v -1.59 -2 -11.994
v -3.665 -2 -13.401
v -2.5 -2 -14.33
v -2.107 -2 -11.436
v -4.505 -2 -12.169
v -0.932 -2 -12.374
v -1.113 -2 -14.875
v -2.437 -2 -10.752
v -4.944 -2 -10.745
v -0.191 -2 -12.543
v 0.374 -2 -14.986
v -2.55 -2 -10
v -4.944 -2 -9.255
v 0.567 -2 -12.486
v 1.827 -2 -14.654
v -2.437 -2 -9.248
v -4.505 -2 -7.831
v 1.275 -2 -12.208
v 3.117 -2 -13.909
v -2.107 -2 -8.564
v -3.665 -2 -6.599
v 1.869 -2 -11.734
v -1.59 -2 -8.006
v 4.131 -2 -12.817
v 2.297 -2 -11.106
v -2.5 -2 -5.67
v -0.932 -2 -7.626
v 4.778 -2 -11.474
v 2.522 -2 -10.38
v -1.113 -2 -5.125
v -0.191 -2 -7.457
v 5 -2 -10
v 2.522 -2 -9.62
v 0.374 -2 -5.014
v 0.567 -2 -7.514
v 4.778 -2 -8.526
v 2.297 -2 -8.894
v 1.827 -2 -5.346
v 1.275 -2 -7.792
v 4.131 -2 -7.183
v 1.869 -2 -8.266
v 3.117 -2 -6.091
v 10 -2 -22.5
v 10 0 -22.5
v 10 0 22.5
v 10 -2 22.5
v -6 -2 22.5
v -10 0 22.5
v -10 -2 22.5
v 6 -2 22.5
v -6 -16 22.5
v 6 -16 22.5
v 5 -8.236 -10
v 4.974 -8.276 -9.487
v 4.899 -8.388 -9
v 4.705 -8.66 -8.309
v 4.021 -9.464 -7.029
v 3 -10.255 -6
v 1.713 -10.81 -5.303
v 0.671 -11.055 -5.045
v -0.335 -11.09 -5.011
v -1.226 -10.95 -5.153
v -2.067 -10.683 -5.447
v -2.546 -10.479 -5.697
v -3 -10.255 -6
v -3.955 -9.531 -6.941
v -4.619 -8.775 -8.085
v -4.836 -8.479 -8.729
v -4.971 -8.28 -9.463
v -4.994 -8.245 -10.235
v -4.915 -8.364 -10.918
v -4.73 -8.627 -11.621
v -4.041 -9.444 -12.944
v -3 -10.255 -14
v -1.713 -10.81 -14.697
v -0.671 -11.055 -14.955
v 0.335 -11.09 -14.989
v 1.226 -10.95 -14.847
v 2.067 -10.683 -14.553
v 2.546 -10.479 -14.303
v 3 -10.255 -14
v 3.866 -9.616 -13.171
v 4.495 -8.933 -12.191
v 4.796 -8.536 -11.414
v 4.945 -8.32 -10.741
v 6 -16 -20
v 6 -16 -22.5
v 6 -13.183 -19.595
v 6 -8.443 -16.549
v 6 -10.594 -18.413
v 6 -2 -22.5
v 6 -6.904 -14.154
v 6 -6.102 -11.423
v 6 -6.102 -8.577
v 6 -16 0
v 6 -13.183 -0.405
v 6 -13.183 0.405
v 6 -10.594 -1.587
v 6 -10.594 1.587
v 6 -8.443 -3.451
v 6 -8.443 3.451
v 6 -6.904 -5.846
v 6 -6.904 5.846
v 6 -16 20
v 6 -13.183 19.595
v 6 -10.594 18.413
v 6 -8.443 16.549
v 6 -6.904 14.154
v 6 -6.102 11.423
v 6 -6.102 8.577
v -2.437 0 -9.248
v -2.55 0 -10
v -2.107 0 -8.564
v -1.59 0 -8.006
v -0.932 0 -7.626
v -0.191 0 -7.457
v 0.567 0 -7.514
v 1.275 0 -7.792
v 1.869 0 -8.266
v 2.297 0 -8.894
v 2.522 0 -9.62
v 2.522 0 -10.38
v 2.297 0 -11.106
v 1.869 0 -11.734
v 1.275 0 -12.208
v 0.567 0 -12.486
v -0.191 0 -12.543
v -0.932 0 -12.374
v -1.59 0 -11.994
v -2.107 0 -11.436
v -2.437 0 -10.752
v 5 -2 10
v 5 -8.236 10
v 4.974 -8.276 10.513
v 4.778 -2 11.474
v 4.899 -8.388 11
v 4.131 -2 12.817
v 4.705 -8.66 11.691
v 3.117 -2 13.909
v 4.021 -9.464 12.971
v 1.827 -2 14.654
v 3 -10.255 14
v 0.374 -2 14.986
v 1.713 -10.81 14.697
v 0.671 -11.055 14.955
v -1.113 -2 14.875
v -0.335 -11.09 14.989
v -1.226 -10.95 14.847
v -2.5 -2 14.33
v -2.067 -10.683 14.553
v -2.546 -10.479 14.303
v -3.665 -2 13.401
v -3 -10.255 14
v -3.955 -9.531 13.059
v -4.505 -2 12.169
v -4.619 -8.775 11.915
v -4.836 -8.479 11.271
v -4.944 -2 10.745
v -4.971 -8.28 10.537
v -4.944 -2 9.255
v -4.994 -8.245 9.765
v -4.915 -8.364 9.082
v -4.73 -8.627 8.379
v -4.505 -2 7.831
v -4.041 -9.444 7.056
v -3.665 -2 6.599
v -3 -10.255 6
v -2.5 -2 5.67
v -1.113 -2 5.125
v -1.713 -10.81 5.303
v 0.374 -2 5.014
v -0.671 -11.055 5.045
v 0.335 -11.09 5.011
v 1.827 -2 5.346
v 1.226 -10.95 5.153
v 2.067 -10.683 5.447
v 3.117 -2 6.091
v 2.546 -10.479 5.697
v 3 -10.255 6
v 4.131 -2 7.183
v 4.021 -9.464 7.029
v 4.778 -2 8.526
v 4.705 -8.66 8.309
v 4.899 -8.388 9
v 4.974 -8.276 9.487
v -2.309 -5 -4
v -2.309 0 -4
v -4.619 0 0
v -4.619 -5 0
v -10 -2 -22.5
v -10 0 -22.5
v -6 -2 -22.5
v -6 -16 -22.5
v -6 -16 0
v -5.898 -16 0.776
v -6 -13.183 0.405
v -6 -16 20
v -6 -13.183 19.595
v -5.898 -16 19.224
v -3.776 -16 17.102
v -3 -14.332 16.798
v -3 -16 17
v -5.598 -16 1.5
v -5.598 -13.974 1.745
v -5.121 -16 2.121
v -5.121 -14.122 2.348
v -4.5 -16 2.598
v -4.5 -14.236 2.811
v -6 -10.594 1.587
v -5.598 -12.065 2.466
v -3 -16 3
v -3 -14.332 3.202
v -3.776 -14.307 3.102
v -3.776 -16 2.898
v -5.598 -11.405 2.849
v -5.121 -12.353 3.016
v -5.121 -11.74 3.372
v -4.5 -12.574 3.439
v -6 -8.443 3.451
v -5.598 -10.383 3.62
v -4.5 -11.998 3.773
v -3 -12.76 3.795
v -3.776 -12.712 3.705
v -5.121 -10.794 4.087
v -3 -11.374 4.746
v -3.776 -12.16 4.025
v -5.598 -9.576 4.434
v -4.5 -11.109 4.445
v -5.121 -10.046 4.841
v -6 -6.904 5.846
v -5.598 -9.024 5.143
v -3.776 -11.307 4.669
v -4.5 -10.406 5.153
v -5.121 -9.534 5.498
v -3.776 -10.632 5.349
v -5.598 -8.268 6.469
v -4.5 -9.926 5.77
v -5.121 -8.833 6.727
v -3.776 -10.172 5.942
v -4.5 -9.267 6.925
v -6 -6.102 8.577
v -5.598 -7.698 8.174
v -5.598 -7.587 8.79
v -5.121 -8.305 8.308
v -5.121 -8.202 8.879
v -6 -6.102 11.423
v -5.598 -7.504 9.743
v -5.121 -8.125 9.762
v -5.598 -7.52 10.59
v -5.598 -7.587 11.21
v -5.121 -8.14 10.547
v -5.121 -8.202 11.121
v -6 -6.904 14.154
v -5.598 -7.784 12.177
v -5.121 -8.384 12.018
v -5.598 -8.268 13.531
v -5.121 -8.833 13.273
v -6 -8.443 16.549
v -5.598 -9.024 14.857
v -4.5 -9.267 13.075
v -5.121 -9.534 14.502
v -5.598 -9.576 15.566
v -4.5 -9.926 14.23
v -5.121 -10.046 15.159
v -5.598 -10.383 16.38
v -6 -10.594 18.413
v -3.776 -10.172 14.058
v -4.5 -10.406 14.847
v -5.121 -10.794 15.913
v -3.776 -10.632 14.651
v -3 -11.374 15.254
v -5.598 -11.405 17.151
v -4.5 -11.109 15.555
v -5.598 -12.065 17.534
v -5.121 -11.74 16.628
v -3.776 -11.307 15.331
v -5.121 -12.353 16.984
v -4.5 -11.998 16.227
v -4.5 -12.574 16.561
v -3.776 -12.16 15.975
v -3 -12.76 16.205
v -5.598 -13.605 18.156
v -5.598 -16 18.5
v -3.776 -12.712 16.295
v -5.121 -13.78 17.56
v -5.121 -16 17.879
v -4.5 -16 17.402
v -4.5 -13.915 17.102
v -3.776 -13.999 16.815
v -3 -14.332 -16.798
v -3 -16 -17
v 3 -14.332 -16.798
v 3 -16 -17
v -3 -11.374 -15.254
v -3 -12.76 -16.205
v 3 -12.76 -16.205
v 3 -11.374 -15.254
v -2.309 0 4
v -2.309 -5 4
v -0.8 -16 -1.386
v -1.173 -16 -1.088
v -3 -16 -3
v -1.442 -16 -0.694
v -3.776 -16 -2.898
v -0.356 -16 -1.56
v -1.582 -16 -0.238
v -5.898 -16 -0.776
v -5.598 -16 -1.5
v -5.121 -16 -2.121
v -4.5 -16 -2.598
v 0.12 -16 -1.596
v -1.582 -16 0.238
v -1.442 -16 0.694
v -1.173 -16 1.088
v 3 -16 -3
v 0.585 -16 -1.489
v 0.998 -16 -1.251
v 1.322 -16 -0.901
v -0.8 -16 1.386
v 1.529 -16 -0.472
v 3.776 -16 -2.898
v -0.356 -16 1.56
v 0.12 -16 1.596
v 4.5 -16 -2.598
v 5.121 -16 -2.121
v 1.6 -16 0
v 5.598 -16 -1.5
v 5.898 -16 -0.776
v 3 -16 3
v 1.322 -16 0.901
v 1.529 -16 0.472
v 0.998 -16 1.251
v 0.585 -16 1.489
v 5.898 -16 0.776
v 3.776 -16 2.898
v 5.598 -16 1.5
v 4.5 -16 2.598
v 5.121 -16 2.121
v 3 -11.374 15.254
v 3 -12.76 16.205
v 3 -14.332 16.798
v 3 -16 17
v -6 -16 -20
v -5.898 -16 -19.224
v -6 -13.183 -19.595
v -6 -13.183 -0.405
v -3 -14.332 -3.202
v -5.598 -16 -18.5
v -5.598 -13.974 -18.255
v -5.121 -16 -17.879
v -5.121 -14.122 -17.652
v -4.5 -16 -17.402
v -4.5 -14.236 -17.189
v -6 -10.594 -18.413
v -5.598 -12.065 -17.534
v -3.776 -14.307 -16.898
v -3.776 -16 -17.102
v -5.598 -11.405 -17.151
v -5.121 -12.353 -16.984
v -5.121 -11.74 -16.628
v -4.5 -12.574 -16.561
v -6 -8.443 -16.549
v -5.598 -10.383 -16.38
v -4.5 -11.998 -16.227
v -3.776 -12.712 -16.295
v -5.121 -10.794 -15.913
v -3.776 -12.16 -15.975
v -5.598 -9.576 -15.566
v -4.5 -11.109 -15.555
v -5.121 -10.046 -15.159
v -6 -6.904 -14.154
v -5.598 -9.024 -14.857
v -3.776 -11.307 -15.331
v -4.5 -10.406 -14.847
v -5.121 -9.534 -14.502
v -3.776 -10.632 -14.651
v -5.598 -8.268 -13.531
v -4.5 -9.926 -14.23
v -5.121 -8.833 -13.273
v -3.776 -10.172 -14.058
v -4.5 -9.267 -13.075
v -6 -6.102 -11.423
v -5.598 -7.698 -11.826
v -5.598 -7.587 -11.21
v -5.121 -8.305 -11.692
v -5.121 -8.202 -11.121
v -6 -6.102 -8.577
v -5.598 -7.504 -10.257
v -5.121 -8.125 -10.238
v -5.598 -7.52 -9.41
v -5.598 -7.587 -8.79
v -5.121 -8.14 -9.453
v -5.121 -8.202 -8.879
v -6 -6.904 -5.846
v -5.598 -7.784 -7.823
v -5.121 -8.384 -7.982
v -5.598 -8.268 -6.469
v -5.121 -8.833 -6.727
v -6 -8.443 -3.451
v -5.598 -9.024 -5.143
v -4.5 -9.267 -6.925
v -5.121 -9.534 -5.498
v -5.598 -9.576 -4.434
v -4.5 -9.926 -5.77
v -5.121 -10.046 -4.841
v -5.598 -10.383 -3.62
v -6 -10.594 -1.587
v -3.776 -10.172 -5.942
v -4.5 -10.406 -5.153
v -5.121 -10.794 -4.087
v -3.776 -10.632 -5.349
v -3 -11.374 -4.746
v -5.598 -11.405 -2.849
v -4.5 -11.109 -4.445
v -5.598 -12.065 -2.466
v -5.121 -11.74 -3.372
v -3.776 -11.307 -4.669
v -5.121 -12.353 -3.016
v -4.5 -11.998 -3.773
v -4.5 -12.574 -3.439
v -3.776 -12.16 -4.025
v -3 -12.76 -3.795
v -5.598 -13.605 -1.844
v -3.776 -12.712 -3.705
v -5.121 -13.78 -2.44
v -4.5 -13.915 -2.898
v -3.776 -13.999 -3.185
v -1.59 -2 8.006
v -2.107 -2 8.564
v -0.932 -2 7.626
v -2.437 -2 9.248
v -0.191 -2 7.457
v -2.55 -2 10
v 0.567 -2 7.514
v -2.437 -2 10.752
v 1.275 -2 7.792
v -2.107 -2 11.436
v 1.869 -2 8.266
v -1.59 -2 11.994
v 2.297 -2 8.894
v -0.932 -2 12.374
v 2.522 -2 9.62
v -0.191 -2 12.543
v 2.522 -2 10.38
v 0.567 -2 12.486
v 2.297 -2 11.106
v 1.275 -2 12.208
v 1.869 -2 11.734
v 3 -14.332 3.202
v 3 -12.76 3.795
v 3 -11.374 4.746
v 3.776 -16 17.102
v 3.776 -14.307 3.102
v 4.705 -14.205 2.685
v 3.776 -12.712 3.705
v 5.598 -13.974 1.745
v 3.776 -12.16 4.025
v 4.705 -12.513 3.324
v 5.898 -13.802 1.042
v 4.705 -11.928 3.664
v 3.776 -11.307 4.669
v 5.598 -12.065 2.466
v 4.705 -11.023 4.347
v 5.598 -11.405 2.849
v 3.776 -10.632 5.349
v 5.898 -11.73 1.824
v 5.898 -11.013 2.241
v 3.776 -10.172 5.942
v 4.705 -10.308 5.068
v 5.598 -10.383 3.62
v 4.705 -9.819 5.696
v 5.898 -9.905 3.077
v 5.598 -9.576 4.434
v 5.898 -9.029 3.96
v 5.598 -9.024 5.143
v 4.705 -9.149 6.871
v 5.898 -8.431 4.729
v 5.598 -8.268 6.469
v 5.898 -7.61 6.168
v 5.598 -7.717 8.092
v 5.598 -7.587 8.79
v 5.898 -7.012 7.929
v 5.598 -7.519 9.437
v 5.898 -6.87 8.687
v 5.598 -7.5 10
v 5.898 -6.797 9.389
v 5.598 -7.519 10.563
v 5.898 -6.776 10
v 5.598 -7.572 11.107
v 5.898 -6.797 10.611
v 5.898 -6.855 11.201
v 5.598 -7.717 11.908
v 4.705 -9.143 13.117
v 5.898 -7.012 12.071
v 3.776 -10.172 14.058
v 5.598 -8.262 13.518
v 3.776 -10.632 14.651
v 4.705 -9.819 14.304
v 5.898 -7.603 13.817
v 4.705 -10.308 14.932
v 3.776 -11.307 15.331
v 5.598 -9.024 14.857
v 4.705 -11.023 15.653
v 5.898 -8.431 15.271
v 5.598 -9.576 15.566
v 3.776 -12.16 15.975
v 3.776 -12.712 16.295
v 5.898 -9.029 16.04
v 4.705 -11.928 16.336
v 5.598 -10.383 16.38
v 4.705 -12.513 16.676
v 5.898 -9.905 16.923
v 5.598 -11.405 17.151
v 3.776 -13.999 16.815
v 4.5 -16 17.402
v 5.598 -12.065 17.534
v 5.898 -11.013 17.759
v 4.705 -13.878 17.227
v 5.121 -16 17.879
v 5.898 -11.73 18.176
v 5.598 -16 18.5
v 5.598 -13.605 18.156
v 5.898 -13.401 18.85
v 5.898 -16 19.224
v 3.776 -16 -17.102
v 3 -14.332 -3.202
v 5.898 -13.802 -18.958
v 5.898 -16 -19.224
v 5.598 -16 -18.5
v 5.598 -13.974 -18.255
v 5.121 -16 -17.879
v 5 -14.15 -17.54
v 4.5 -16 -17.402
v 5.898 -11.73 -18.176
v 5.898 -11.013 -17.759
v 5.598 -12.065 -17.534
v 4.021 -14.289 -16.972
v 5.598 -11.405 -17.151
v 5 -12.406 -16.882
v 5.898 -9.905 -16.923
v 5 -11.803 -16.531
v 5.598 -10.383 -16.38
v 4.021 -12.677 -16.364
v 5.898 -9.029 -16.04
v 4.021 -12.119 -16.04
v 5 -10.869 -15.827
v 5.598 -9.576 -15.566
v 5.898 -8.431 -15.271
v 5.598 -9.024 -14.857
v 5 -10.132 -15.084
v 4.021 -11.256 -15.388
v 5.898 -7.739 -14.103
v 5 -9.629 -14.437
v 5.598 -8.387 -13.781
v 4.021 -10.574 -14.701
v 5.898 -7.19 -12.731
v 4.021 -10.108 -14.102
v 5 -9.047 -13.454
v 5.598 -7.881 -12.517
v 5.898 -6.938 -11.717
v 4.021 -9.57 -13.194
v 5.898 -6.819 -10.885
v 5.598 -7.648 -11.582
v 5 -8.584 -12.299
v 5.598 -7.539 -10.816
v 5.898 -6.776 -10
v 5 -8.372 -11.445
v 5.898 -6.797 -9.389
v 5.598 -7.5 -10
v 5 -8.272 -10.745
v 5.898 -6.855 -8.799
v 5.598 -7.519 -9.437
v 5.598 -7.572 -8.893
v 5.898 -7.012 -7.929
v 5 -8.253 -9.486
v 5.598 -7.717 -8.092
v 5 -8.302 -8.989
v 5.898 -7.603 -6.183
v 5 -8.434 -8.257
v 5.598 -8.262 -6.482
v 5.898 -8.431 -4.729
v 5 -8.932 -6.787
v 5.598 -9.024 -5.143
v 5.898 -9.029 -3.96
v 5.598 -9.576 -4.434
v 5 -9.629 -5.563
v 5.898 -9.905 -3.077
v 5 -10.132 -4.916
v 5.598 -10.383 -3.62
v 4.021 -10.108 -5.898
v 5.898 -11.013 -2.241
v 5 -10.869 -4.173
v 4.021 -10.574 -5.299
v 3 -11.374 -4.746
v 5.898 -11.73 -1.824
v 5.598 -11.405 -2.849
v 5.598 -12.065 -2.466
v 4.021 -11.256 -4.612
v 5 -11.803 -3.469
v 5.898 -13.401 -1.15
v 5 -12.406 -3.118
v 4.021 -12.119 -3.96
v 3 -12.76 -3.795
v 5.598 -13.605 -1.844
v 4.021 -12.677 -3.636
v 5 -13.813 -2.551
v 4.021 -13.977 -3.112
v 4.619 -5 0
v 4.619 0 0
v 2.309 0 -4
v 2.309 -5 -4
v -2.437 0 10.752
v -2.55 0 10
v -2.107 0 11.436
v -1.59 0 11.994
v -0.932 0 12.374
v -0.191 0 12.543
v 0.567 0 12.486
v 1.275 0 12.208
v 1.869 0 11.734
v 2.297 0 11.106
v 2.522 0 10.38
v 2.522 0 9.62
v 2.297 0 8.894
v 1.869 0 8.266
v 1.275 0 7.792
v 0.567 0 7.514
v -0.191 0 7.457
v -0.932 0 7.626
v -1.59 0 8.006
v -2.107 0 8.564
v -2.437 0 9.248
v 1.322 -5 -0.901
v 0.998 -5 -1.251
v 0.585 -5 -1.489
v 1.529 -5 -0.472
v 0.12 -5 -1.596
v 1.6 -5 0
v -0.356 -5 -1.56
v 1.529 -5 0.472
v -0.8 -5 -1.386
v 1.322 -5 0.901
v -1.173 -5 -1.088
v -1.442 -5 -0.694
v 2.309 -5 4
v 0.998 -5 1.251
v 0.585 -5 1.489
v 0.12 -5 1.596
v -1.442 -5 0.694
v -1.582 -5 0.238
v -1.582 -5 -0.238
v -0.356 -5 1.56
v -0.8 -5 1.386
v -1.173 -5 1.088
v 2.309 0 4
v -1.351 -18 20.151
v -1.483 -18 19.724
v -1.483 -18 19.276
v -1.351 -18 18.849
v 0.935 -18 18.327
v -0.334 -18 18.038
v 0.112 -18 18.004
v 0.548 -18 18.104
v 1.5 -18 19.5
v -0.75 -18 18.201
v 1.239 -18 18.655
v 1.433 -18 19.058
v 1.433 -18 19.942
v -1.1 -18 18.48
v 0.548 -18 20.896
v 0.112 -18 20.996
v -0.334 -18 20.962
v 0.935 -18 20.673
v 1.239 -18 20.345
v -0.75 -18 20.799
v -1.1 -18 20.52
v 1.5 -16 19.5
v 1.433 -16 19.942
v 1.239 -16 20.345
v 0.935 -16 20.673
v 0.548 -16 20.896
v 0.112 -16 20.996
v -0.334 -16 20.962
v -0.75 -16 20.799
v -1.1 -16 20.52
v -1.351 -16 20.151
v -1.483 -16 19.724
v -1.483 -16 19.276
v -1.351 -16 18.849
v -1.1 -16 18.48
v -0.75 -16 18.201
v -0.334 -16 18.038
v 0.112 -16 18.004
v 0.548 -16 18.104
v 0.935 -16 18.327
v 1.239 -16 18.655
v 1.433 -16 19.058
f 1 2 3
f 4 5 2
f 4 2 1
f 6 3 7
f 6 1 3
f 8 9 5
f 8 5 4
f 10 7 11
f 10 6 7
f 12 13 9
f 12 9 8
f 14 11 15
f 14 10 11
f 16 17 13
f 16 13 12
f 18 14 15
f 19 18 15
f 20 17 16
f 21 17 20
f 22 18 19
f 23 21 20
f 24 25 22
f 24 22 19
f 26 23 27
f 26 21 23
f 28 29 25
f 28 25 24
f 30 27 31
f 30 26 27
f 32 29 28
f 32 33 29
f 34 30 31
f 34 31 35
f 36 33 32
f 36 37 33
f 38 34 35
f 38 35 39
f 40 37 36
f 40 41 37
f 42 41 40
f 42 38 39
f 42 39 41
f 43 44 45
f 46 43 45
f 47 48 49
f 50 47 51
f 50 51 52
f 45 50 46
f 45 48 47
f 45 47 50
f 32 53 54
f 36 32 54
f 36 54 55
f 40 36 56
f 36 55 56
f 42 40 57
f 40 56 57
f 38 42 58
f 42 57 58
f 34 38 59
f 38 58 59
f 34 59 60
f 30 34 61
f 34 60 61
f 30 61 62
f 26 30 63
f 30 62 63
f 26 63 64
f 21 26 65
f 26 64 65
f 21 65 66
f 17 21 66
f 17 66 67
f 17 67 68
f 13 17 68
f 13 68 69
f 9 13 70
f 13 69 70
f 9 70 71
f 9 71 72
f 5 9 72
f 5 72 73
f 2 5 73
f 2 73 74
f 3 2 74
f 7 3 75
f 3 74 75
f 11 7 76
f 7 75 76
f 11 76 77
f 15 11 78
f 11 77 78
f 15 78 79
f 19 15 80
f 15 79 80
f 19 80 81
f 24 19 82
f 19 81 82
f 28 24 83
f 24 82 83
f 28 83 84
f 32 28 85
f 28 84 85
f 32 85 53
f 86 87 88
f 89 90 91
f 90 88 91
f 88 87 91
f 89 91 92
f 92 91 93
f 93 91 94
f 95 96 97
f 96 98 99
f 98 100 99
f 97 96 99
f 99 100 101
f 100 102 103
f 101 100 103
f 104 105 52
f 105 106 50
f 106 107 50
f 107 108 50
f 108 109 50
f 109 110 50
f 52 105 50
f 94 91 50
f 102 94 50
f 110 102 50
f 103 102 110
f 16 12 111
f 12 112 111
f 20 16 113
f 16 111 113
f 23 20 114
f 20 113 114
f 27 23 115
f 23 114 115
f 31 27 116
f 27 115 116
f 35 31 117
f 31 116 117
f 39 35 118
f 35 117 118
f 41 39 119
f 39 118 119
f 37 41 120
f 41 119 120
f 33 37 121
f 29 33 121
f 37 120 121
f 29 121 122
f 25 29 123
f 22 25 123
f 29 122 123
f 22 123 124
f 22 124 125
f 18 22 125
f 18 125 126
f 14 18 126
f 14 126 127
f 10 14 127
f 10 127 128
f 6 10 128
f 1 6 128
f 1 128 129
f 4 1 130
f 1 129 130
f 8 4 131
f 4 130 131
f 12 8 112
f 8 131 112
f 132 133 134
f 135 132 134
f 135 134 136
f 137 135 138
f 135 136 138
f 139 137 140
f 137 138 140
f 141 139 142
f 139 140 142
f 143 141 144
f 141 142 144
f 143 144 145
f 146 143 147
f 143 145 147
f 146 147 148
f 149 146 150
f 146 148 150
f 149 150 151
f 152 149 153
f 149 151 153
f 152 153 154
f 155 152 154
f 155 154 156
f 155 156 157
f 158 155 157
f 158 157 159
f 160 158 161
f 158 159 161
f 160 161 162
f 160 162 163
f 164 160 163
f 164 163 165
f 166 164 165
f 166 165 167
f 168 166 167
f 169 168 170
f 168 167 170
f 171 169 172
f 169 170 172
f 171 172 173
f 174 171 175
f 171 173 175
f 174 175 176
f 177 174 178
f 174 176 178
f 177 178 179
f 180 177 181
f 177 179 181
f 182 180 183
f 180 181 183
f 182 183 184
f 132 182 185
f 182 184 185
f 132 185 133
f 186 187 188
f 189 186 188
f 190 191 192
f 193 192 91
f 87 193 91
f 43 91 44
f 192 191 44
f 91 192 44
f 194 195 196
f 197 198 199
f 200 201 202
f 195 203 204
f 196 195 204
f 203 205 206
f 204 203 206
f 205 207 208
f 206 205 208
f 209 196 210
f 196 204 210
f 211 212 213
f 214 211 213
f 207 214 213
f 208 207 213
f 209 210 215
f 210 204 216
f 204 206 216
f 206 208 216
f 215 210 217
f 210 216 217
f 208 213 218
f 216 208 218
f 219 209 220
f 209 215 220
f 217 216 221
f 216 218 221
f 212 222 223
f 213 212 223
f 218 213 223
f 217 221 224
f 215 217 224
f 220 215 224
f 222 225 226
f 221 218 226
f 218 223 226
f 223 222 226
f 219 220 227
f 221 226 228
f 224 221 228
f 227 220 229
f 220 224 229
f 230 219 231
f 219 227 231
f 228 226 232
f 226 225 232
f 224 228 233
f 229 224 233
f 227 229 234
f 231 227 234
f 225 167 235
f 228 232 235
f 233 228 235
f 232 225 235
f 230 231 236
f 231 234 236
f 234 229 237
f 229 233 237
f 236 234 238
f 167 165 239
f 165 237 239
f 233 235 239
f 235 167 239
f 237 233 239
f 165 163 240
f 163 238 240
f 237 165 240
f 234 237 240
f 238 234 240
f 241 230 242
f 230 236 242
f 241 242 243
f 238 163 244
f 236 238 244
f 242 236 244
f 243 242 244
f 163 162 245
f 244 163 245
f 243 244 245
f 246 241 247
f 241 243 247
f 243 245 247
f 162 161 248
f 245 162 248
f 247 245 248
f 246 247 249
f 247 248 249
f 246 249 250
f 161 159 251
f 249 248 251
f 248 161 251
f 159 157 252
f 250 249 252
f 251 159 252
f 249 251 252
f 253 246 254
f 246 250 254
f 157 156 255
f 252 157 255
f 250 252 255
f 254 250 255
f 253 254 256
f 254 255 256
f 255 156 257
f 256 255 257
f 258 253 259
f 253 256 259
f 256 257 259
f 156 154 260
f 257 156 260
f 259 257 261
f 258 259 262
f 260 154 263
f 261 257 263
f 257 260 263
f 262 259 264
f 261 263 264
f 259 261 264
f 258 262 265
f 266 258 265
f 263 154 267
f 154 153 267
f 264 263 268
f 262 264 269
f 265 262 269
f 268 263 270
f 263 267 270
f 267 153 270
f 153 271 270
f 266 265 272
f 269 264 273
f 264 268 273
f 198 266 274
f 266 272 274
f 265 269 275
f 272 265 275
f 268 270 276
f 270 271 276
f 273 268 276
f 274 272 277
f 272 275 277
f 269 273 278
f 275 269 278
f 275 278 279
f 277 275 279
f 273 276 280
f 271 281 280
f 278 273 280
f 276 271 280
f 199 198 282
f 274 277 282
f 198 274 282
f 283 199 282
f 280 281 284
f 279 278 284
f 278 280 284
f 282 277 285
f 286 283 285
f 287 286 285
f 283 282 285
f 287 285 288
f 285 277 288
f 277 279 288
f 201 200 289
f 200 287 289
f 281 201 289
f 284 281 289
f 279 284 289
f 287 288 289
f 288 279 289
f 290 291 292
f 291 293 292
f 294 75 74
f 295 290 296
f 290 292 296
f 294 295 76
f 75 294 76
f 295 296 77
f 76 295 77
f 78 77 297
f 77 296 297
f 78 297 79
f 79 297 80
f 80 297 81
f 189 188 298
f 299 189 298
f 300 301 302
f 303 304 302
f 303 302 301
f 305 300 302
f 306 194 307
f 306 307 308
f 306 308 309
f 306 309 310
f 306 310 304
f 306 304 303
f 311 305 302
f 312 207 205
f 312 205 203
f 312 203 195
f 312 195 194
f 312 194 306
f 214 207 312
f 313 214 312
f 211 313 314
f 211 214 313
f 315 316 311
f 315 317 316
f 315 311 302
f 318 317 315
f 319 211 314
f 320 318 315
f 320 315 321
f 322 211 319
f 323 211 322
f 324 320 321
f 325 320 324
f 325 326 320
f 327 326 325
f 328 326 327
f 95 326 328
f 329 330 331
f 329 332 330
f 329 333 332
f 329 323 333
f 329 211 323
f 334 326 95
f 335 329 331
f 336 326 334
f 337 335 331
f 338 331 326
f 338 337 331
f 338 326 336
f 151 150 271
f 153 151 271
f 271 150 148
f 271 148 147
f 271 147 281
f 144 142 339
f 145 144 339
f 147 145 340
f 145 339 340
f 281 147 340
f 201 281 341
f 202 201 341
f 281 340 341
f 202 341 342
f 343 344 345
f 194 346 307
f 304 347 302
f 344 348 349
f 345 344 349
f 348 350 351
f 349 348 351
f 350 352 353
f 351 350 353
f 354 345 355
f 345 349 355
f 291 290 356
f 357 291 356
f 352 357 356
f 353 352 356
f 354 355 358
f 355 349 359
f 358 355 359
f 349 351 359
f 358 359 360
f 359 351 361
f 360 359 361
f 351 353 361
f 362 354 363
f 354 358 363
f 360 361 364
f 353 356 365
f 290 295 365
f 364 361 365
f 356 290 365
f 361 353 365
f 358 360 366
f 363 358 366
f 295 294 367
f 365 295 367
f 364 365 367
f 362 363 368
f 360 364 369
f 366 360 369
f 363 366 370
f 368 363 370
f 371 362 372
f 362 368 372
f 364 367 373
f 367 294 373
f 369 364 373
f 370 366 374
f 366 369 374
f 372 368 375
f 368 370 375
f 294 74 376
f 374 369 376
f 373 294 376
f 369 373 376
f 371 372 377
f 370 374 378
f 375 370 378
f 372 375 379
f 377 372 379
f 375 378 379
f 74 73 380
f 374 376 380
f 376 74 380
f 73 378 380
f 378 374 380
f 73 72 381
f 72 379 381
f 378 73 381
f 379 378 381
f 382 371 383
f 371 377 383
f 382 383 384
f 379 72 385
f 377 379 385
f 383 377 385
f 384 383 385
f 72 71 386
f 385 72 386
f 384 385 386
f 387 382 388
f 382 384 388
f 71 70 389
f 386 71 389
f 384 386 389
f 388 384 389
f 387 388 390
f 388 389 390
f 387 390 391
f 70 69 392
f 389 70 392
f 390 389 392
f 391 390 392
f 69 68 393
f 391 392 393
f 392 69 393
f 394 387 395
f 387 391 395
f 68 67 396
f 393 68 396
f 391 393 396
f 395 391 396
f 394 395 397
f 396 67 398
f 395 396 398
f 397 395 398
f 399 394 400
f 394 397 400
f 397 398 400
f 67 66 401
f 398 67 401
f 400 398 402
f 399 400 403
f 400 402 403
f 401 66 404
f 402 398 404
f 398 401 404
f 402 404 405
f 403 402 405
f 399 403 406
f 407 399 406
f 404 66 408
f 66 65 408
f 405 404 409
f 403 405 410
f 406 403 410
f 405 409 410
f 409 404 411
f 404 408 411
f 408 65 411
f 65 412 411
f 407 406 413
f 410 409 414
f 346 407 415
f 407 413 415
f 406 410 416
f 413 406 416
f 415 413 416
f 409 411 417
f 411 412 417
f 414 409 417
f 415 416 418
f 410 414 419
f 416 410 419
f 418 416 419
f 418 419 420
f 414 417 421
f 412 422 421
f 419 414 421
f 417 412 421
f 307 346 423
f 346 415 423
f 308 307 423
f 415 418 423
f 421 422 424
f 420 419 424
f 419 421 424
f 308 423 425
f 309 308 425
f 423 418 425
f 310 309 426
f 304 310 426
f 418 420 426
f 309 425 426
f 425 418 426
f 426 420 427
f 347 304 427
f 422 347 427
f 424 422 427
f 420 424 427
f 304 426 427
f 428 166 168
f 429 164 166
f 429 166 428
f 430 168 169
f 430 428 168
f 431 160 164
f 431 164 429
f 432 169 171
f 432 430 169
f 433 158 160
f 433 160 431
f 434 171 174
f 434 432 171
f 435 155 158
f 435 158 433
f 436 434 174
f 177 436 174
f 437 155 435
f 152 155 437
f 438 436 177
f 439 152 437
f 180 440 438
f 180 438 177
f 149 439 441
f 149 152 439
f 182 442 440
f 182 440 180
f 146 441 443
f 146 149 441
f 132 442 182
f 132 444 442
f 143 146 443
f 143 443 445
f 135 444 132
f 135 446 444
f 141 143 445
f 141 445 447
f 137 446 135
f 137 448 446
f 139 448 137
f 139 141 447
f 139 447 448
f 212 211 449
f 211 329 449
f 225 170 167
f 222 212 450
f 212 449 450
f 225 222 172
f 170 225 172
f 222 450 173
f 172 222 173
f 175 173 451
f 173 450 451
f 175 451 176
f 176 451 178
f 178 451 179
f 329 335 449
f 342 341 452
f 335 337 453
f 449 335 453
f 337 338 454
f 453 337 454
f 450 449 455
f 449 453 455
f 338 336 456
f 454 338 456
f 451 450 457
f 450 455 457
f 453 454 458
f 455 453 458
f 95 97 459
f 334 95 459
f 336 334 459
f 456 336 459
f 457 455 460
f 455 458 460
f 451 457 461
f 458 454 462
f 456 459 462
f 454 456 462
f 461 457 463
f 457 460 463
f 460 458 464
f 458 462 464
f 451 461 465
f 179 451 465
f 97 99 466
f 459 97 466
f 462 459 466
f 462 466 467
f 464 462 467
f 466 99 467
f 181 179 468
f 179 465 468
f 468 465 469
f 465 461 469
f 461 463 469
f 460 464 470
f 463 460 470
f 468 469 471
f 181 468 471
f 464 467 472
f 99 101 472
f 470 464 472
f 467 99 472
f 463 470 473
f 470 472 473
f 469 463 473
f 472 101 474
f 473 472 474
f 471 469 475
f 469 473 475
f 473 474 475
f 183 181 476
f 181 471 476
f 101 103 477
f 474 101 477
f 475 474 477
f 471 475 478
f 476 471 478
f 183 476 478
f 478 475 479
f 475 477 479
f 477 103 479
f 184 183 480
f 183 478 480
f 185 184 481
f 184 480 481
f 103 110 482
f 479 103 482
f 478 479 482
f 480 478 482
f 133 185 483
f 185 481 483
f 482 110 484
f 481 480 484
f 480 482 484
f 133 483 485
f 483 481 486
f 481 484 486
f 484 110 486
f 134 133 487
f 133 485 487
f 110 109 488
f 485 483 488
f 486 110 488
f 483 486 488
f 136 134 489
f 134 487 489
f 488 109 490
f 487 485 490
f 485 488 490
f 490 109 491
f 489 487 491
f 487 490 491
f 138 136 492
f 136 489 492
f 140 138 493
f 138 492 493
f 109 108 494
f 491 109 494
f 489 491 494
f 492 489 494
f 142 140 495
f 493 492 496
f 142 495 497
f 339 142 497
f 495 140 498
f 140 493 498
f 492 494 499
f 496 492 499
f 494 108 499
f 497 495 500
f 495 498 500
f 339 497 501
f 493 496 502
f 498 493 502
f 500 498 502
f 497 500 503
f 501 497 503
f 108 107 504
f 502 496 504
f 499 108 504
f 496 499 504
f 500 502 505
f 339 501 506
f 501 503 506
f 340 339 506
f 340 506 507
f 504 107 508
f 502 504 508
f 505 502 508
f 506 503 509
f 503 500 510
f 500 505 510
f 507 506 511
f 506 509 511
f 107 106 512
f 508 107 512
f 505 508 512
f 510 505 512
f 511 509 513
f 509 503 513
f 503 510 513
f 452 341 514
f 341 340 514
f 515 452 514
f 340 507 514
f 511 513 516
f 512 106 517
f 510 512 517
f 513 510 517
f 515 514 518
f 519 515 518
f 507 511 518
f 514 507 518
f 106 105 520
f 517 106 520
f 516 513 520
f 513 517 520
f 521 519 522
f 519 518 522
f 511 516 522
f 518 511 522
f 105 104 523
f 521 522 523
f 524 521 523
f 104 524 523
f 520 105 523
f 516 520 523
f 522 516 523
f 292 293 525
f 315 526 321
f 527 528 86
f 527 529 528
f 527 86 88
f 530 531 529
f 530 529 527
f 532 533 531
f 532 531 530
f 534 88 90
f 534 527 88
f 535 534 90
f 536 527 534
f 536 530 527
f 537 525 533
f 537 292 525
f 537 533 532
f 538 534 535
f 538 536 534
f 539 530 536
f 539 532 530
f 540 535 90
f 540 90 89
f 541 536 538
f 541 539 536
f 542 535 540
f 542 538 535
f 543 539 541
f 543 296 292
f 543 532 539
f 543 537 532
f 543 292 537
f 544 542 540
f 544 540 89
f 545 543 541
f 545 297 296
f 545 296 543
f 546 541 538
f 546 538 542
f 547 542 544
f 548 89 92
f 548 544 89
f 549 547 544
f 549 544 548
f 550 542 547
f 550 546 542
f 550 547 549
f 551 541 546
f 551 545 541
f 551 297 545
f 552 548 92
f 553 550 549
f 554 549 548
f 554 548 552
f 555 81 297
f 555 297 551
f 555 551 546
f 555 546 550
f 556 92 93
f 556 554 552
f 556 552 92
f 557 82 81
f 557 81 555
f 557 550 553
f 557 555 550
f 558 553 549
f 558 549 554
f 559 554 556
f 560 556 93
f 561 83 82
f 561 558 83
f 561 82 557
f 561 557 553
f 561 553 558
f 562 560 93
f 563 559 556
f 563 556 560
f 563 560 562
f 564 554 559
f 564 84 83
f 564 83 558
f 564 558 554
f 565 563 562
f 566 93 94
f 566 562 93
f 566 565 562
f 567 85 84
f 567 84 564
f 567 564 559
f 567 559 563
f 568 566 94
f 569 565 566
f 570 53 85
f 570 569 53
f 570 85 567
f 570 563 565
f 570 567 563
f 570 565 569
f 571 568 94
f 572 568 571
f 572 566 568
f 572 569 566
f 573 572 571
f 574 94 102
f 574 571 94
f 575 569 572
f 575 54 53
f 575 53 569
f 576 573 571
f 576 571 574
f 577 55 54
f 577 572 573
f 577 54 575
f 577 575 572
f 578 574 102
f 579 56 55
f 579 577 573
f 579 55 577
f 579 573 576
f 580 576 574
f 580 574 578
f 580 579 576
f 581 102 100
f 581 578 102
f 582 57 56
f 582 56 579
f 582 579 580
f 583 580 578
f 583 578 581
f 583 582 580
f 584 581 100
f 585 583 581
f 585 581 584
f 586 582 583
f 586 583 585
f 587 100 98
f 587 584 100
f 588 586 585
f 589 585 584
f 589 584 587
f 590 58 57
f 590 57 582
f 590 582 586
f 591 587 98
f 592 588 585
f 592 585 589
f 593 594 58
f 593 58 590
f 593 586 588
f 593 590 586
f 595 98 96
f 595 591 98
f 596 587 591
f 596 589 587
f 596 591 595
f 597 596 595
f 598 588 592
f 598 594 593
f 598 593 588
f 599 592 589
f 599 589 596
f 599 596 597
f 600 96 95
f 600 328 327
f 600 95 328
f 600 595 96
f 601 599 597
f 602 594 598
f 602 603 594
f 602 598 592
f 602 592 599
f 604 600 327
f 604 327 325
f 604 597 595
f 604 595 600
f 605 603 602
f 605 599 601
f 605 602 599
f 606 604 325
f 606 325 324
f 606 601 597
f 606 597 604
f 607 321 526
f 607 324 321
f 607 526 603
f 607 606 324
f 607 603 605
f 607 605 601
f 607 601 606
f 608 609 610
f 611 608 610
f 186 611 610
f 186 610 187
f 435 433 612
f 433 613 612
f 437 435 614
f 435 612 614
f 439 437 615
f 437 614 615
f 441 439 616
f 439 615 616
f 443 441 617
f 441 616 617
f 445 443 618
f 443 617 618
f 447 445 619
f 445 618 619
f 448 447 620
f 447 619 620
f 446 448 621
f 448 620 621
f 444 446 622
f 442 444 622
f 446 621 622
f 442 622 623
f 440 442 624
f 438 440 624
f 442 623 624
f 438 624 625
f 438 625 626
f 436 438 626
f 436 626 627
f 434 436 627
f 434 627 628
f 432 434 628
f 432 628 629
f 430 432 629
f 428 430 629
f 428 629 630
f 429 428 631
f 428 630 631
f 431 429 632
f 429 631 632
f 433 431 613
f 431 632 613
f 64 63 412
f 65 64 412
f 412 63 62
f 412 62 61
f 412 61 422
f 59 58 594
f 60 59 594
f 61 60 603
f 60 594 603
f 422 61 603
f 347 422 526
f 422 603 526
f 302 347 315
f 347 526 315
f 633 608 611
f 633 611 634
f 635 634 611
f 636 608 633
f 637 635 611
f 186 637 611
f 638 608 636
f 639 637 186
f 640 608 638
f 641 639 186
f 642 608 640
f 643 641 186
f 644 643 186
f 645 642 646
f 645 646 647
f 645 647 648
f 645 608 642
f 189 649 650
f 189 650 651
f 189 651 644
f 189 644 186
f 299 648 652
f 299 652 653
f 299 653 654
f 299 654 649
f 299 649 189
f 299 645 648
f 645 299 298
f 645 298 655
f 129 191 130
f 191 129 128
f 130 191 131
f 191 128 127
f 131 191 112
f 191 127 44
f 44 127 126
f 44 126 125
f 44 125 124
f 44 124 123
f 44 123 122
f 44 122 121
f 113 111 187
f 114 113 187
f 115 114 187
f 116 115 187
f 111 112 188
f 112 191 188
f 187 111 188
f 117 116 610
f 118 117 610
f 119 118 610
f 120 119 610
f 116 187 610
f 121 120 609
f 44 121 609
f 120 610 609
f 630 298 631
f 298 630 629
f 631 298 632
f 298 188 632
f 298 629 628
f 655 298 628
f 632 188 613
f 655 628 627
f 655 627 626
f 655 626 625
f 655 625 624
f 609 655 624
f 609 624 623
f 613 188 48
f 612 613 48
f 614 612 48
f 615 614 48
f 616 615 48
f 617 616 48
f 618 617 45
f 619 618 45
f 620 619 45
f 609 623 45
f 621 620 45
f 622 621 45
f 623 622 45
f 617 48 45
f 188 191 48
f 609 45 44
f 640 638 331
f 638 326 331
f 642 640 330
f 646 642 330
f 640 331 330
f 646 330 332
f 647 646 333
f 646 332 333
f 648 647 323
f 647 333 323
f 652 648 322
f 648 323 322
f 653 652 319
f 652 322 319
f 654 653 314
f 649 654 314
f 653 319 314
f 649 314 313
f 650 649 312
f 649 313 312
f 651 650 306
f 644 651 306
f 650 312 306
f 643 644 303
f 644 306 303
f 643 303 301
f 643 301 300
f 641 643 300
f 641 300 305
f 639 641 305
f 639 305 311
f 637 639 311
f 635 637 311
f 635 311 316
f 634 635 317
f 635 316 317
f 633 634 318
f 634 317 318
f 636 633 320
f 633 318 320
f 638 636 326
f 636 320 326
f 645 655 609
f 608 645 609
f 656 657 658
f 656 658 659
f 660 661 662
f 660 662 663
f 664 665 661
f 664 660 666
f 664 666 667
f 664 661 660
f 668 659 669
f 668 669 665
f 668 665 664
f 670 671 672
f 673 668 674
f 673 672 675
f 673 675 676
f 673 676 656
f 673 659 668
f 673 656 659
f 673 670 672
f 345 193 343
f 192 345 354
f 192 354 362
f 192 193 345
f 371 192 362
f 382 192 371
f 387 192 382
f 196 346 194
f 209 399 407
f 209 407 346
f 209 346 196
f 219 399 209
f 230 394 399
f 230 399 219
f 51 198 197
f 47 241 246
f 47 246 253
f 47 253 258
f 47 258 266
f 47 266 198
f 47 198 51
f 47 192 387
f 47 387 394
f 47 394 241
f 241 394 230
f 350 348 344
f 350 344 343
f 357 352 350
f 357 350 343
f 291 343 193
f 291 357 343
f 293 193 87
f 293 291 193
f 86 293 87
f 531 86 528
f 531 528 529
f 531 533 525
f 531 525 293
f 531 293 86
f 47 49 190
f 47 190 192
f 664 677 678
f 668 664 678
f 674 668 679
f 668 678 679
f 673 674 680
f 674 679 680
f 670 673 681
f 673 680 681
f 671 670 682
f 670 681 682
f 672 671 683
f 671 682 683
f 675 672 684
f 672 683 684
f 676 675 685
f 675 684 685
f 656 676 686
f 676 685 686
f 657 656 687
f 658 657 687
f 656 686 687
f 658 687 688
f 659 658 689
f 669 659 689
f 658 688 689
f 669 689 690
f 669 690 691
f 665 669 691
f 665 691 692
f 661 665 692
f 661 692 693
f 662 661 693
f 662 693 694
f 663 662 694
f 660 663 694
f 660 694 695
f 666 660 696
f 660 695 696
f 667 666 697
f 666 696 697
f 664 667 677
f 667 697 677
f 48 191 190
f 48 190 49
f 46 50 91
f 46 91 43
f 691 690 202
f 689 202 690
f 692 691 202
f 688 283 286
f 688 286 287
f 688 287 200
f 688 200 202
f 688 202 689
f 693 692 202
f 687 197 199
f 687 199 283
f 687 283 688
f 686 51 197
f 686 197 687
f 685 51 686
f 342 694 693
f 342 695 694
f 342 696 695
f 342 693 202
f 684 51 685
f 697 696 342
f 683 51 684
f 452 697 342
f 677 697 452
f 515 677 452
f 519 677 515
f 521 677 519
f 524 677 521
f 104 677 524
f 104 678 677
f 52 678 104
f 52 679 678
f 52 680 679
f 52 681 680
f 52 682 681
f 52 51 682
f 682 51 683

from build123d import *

# Parameters (mm, degrees)
F1_W            = 12
F1_H            = 45
F2_DEPTH        = 30
F3_R            = 7
F4_DEPTH        = 12.001
F5_W            = 20
F5_H            = 45
F6_DEPTH        = 2
F7_R            = 2.99999
F9_D            = 3.2
F11_SIZE        = 1
F13_D           = 5.1
F13_CBORE_D     = 10
F13_CBORE_DEPTH = 14
F15_DEPTH       = 5
F16_W           = 41.8421067297
F16_H           = 67.5000026822
F17_DEPTH       = 25
F18_R           = 1.5
F19_DEPTH       = 2


# Not quite as in the source:
# - a fillet or chamfer is up to 0.001 mm smaller than in the source, because OpenCascade refuses the exact size


with BuildPart() as f2:
    # F1 (on Front) → F2 (new body)
    with BuildSketch(Plane.XZ):
        Rectangle(F1_W, F1_H)
    extrude(amount=F2_DEPTH)

    # F3 (on face) → F4 (cut, through all)
    with BuildSketch(Plane.YZ.offset(6)):
        with Locations((-16, 10)):
            Circle(F3_R)
        with Locations((-16, -10)):
            Circle(F3_R)
    extrude(amount=-F4_DEPTH, mode=Mode.SUBTRACT)

    # F5 (on Front) → F6 (join)
    with BuildSketch(Plane.XZ):
        Rectangle(F5_W, F5_H)
    extrude(amount=F6_DEPTH)

    # F7 (radius 3 in the source; OpenCascade refuses exactly that, so slightly less here)
    f7_edges = [f2.edges().sort_by_distance(p)[0] for p in [
        (-6, -23, 10),
        (-6, -23, -10),
        (6, -23, 10),
        (6, -23, -10),
    ]]
    fillet(f7_edges, radius=F7_R)

    # F9 (through all)
    with Locations(Plane(origin=(0, 0, 0), x_dir=(-1, 0, 0), z_dir=(0, 1, 0))):
        with Locations((0, 10), (0, -10), (0, 0)):
            Hole(F9_D / 2)

    # F11
    f11_edges = [f2.edges().sort_by_distance(p)[0] for p in [
        (0, -30, -22.5),
        (0, -30, 22.5),
    ]]
    chamfer(f11_edges, length=F11_SIZE)

    # F13 (through all)
    with Locations(Plane.XZ.offset(16)):
        with Locations((0, -10), (0, 10)):
            CounterBoreHole(F13_D / 2, F13_CBORE_D / 2, F13_CBORE_DEPTH)

    # F14 (on face) → F15 (cut)
    with BuildSketch(Plane(origin=(0, 0, 0), x_dir=(-1, 0, 0), z_dir=(0, 1, 0))):
        Polygon((2.3094010768, -4), (4.6188021535, 0), (2.3094010768, 4), (-2.3094010768, 4), (-4.6188021535, 0), (-2.3094010768, -4), align=None)
    extrude(amount=-F15_DEPTH, mode=Mode.SUBTRACT)

    # F16 (on offset) → F17 (cut)
    with BuildSketch(Plane.XZ.offset(16)):
        with Locations((-0.493420288, -0.09868294)):
            Rectangle(F16_W, F16_H)
    extrude(amount=F17_DEPTH, mode=Mode.SUBTRACT)

    # F18 (on face) → F19 (join)
    with BuildSketch(Plane.XZ.offset(16)):
        with Locations((0, 19.5)):
            Circle(F18_R)
    extrude(amount=F19_DEPTH)


solid = f2.part
